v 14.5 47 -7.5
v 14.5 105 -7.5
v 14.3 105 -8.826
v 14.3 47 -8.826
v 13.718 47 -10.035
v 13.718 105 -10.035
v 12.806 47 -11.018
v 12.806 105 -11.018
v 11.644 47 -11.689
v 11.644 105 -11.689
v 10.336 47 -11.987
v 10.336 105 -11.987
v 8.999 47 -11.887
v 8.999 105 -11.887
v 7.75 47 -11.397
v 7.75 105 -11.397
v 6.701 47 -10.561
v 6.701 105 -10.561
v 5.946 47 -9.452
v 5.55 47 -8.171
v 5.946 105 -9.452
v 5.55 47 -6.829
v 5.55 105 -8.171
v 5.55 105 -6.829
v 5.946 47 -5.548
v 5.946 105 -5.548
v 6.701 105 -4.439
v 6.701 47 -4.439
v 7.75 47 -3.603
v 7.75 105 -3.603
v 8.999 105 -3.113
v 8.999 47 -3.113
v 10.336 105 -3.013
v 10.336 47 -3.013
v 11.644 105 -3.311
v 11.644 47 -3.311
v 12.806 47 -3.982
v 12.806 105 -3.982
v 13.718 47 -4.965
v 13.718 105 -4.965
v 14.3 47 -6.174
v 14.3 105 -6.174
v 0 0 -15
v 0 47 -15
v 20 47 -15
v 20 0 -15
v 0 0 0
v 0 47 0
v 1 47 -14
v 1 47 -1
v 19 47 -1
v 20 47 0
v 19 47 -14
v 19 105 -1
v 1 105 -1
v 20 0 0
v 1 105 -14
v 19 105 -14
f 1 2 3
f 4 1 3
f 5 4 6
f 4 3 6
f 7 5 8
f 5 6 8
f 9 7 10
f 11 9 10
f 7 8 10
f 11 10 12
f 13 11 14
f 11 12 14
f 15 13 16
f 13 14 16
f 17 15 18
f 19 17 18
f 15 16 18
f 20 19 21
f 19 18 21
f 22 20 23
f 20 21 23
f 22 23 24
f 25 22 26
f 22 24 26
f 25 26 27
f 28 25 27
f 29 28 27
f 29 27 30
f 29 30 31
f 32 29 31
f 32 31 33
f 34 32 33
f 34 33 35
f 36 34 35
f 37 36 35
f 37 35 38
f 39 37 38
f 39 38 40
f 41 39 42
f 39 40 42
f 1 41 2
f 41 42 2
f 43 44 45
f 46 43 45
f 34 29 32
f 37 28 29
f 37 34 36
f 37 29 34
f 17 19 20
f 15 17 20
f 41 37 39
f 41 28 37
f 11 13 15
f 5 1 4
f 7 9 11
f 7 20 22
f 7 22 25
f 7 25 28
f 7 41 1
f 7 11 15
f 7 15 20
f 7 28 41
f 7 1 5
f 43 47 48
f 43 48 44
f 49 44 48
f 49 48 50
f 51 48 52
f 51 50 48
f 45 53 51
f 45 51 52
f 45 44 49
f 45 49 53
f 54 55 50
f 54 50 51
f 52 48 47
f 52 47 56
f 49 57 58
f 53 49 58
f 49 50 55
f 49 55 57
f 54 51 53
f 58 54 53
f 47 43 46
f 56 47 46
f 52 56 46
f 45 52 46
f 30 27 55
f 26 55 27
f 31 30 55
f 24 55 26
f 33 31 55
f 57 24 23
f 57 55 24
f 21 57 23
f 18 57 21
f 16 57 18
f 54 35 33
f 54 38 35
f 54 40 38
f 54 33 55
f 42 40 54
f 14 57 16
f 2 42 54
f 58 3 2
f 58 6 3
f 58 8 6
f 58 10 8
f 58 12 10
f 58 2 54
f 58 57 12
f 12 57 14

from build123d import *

# Parameters (mm, degrees)
SKETCH1_W           = 20
SKETCH1_H           = 15
BOSS_EXTRUDE1_DEPTH = 47
SKETCH2_W           = 18
SKETCH2_H           = 13
BOSS_EXTRUDE2_DEPTH = 58
SKETCH3_R           = 4.5
CUT_EXTRUDE1_DEPTH  = 58


with BuildPart() as part:
    # Sketch1 → Boss-Extrude1 (new body)
    with BuildSketch(Plane(origin=(0, 0, 0), x_dir=(1, 0, 0), z_dir=(0, 1, 0))):
        with Locations((10, 7.5)):
            Rectangle(SKETCH1_W, SKETCH1_H)
    extrude(amount=BOSS_EXTRUDE1_DEPTH)

    # Sketch2 → Boss-Extrude2 (add)
    with BuildSketch(Plane(origin=(0, 47, 0), x_dir=(1, 0, 0), z_dir=(0, 1, 0))):
        with Locations((10, 7.5)):
            Rectangle(SKETCH2_W, SKETCH2_H)
    extrude(amount=BOSS_EXTRUDE2_DEPTH)

    # Sketch3 → Cut-Extrude1 (cut)
    with BuildSketch(Plane(origin=(0, 105, 0), x_dir=(1, 0, 0), z_dir=(0, 1, 0))):
        with Locations((10, 7.5)):
            Circle(SKETCH3_R)
    extrude(amount=-CUT_EXTRUDE1_DEPTH, mode=Mode.SUBTRACT)


solid = part.part
